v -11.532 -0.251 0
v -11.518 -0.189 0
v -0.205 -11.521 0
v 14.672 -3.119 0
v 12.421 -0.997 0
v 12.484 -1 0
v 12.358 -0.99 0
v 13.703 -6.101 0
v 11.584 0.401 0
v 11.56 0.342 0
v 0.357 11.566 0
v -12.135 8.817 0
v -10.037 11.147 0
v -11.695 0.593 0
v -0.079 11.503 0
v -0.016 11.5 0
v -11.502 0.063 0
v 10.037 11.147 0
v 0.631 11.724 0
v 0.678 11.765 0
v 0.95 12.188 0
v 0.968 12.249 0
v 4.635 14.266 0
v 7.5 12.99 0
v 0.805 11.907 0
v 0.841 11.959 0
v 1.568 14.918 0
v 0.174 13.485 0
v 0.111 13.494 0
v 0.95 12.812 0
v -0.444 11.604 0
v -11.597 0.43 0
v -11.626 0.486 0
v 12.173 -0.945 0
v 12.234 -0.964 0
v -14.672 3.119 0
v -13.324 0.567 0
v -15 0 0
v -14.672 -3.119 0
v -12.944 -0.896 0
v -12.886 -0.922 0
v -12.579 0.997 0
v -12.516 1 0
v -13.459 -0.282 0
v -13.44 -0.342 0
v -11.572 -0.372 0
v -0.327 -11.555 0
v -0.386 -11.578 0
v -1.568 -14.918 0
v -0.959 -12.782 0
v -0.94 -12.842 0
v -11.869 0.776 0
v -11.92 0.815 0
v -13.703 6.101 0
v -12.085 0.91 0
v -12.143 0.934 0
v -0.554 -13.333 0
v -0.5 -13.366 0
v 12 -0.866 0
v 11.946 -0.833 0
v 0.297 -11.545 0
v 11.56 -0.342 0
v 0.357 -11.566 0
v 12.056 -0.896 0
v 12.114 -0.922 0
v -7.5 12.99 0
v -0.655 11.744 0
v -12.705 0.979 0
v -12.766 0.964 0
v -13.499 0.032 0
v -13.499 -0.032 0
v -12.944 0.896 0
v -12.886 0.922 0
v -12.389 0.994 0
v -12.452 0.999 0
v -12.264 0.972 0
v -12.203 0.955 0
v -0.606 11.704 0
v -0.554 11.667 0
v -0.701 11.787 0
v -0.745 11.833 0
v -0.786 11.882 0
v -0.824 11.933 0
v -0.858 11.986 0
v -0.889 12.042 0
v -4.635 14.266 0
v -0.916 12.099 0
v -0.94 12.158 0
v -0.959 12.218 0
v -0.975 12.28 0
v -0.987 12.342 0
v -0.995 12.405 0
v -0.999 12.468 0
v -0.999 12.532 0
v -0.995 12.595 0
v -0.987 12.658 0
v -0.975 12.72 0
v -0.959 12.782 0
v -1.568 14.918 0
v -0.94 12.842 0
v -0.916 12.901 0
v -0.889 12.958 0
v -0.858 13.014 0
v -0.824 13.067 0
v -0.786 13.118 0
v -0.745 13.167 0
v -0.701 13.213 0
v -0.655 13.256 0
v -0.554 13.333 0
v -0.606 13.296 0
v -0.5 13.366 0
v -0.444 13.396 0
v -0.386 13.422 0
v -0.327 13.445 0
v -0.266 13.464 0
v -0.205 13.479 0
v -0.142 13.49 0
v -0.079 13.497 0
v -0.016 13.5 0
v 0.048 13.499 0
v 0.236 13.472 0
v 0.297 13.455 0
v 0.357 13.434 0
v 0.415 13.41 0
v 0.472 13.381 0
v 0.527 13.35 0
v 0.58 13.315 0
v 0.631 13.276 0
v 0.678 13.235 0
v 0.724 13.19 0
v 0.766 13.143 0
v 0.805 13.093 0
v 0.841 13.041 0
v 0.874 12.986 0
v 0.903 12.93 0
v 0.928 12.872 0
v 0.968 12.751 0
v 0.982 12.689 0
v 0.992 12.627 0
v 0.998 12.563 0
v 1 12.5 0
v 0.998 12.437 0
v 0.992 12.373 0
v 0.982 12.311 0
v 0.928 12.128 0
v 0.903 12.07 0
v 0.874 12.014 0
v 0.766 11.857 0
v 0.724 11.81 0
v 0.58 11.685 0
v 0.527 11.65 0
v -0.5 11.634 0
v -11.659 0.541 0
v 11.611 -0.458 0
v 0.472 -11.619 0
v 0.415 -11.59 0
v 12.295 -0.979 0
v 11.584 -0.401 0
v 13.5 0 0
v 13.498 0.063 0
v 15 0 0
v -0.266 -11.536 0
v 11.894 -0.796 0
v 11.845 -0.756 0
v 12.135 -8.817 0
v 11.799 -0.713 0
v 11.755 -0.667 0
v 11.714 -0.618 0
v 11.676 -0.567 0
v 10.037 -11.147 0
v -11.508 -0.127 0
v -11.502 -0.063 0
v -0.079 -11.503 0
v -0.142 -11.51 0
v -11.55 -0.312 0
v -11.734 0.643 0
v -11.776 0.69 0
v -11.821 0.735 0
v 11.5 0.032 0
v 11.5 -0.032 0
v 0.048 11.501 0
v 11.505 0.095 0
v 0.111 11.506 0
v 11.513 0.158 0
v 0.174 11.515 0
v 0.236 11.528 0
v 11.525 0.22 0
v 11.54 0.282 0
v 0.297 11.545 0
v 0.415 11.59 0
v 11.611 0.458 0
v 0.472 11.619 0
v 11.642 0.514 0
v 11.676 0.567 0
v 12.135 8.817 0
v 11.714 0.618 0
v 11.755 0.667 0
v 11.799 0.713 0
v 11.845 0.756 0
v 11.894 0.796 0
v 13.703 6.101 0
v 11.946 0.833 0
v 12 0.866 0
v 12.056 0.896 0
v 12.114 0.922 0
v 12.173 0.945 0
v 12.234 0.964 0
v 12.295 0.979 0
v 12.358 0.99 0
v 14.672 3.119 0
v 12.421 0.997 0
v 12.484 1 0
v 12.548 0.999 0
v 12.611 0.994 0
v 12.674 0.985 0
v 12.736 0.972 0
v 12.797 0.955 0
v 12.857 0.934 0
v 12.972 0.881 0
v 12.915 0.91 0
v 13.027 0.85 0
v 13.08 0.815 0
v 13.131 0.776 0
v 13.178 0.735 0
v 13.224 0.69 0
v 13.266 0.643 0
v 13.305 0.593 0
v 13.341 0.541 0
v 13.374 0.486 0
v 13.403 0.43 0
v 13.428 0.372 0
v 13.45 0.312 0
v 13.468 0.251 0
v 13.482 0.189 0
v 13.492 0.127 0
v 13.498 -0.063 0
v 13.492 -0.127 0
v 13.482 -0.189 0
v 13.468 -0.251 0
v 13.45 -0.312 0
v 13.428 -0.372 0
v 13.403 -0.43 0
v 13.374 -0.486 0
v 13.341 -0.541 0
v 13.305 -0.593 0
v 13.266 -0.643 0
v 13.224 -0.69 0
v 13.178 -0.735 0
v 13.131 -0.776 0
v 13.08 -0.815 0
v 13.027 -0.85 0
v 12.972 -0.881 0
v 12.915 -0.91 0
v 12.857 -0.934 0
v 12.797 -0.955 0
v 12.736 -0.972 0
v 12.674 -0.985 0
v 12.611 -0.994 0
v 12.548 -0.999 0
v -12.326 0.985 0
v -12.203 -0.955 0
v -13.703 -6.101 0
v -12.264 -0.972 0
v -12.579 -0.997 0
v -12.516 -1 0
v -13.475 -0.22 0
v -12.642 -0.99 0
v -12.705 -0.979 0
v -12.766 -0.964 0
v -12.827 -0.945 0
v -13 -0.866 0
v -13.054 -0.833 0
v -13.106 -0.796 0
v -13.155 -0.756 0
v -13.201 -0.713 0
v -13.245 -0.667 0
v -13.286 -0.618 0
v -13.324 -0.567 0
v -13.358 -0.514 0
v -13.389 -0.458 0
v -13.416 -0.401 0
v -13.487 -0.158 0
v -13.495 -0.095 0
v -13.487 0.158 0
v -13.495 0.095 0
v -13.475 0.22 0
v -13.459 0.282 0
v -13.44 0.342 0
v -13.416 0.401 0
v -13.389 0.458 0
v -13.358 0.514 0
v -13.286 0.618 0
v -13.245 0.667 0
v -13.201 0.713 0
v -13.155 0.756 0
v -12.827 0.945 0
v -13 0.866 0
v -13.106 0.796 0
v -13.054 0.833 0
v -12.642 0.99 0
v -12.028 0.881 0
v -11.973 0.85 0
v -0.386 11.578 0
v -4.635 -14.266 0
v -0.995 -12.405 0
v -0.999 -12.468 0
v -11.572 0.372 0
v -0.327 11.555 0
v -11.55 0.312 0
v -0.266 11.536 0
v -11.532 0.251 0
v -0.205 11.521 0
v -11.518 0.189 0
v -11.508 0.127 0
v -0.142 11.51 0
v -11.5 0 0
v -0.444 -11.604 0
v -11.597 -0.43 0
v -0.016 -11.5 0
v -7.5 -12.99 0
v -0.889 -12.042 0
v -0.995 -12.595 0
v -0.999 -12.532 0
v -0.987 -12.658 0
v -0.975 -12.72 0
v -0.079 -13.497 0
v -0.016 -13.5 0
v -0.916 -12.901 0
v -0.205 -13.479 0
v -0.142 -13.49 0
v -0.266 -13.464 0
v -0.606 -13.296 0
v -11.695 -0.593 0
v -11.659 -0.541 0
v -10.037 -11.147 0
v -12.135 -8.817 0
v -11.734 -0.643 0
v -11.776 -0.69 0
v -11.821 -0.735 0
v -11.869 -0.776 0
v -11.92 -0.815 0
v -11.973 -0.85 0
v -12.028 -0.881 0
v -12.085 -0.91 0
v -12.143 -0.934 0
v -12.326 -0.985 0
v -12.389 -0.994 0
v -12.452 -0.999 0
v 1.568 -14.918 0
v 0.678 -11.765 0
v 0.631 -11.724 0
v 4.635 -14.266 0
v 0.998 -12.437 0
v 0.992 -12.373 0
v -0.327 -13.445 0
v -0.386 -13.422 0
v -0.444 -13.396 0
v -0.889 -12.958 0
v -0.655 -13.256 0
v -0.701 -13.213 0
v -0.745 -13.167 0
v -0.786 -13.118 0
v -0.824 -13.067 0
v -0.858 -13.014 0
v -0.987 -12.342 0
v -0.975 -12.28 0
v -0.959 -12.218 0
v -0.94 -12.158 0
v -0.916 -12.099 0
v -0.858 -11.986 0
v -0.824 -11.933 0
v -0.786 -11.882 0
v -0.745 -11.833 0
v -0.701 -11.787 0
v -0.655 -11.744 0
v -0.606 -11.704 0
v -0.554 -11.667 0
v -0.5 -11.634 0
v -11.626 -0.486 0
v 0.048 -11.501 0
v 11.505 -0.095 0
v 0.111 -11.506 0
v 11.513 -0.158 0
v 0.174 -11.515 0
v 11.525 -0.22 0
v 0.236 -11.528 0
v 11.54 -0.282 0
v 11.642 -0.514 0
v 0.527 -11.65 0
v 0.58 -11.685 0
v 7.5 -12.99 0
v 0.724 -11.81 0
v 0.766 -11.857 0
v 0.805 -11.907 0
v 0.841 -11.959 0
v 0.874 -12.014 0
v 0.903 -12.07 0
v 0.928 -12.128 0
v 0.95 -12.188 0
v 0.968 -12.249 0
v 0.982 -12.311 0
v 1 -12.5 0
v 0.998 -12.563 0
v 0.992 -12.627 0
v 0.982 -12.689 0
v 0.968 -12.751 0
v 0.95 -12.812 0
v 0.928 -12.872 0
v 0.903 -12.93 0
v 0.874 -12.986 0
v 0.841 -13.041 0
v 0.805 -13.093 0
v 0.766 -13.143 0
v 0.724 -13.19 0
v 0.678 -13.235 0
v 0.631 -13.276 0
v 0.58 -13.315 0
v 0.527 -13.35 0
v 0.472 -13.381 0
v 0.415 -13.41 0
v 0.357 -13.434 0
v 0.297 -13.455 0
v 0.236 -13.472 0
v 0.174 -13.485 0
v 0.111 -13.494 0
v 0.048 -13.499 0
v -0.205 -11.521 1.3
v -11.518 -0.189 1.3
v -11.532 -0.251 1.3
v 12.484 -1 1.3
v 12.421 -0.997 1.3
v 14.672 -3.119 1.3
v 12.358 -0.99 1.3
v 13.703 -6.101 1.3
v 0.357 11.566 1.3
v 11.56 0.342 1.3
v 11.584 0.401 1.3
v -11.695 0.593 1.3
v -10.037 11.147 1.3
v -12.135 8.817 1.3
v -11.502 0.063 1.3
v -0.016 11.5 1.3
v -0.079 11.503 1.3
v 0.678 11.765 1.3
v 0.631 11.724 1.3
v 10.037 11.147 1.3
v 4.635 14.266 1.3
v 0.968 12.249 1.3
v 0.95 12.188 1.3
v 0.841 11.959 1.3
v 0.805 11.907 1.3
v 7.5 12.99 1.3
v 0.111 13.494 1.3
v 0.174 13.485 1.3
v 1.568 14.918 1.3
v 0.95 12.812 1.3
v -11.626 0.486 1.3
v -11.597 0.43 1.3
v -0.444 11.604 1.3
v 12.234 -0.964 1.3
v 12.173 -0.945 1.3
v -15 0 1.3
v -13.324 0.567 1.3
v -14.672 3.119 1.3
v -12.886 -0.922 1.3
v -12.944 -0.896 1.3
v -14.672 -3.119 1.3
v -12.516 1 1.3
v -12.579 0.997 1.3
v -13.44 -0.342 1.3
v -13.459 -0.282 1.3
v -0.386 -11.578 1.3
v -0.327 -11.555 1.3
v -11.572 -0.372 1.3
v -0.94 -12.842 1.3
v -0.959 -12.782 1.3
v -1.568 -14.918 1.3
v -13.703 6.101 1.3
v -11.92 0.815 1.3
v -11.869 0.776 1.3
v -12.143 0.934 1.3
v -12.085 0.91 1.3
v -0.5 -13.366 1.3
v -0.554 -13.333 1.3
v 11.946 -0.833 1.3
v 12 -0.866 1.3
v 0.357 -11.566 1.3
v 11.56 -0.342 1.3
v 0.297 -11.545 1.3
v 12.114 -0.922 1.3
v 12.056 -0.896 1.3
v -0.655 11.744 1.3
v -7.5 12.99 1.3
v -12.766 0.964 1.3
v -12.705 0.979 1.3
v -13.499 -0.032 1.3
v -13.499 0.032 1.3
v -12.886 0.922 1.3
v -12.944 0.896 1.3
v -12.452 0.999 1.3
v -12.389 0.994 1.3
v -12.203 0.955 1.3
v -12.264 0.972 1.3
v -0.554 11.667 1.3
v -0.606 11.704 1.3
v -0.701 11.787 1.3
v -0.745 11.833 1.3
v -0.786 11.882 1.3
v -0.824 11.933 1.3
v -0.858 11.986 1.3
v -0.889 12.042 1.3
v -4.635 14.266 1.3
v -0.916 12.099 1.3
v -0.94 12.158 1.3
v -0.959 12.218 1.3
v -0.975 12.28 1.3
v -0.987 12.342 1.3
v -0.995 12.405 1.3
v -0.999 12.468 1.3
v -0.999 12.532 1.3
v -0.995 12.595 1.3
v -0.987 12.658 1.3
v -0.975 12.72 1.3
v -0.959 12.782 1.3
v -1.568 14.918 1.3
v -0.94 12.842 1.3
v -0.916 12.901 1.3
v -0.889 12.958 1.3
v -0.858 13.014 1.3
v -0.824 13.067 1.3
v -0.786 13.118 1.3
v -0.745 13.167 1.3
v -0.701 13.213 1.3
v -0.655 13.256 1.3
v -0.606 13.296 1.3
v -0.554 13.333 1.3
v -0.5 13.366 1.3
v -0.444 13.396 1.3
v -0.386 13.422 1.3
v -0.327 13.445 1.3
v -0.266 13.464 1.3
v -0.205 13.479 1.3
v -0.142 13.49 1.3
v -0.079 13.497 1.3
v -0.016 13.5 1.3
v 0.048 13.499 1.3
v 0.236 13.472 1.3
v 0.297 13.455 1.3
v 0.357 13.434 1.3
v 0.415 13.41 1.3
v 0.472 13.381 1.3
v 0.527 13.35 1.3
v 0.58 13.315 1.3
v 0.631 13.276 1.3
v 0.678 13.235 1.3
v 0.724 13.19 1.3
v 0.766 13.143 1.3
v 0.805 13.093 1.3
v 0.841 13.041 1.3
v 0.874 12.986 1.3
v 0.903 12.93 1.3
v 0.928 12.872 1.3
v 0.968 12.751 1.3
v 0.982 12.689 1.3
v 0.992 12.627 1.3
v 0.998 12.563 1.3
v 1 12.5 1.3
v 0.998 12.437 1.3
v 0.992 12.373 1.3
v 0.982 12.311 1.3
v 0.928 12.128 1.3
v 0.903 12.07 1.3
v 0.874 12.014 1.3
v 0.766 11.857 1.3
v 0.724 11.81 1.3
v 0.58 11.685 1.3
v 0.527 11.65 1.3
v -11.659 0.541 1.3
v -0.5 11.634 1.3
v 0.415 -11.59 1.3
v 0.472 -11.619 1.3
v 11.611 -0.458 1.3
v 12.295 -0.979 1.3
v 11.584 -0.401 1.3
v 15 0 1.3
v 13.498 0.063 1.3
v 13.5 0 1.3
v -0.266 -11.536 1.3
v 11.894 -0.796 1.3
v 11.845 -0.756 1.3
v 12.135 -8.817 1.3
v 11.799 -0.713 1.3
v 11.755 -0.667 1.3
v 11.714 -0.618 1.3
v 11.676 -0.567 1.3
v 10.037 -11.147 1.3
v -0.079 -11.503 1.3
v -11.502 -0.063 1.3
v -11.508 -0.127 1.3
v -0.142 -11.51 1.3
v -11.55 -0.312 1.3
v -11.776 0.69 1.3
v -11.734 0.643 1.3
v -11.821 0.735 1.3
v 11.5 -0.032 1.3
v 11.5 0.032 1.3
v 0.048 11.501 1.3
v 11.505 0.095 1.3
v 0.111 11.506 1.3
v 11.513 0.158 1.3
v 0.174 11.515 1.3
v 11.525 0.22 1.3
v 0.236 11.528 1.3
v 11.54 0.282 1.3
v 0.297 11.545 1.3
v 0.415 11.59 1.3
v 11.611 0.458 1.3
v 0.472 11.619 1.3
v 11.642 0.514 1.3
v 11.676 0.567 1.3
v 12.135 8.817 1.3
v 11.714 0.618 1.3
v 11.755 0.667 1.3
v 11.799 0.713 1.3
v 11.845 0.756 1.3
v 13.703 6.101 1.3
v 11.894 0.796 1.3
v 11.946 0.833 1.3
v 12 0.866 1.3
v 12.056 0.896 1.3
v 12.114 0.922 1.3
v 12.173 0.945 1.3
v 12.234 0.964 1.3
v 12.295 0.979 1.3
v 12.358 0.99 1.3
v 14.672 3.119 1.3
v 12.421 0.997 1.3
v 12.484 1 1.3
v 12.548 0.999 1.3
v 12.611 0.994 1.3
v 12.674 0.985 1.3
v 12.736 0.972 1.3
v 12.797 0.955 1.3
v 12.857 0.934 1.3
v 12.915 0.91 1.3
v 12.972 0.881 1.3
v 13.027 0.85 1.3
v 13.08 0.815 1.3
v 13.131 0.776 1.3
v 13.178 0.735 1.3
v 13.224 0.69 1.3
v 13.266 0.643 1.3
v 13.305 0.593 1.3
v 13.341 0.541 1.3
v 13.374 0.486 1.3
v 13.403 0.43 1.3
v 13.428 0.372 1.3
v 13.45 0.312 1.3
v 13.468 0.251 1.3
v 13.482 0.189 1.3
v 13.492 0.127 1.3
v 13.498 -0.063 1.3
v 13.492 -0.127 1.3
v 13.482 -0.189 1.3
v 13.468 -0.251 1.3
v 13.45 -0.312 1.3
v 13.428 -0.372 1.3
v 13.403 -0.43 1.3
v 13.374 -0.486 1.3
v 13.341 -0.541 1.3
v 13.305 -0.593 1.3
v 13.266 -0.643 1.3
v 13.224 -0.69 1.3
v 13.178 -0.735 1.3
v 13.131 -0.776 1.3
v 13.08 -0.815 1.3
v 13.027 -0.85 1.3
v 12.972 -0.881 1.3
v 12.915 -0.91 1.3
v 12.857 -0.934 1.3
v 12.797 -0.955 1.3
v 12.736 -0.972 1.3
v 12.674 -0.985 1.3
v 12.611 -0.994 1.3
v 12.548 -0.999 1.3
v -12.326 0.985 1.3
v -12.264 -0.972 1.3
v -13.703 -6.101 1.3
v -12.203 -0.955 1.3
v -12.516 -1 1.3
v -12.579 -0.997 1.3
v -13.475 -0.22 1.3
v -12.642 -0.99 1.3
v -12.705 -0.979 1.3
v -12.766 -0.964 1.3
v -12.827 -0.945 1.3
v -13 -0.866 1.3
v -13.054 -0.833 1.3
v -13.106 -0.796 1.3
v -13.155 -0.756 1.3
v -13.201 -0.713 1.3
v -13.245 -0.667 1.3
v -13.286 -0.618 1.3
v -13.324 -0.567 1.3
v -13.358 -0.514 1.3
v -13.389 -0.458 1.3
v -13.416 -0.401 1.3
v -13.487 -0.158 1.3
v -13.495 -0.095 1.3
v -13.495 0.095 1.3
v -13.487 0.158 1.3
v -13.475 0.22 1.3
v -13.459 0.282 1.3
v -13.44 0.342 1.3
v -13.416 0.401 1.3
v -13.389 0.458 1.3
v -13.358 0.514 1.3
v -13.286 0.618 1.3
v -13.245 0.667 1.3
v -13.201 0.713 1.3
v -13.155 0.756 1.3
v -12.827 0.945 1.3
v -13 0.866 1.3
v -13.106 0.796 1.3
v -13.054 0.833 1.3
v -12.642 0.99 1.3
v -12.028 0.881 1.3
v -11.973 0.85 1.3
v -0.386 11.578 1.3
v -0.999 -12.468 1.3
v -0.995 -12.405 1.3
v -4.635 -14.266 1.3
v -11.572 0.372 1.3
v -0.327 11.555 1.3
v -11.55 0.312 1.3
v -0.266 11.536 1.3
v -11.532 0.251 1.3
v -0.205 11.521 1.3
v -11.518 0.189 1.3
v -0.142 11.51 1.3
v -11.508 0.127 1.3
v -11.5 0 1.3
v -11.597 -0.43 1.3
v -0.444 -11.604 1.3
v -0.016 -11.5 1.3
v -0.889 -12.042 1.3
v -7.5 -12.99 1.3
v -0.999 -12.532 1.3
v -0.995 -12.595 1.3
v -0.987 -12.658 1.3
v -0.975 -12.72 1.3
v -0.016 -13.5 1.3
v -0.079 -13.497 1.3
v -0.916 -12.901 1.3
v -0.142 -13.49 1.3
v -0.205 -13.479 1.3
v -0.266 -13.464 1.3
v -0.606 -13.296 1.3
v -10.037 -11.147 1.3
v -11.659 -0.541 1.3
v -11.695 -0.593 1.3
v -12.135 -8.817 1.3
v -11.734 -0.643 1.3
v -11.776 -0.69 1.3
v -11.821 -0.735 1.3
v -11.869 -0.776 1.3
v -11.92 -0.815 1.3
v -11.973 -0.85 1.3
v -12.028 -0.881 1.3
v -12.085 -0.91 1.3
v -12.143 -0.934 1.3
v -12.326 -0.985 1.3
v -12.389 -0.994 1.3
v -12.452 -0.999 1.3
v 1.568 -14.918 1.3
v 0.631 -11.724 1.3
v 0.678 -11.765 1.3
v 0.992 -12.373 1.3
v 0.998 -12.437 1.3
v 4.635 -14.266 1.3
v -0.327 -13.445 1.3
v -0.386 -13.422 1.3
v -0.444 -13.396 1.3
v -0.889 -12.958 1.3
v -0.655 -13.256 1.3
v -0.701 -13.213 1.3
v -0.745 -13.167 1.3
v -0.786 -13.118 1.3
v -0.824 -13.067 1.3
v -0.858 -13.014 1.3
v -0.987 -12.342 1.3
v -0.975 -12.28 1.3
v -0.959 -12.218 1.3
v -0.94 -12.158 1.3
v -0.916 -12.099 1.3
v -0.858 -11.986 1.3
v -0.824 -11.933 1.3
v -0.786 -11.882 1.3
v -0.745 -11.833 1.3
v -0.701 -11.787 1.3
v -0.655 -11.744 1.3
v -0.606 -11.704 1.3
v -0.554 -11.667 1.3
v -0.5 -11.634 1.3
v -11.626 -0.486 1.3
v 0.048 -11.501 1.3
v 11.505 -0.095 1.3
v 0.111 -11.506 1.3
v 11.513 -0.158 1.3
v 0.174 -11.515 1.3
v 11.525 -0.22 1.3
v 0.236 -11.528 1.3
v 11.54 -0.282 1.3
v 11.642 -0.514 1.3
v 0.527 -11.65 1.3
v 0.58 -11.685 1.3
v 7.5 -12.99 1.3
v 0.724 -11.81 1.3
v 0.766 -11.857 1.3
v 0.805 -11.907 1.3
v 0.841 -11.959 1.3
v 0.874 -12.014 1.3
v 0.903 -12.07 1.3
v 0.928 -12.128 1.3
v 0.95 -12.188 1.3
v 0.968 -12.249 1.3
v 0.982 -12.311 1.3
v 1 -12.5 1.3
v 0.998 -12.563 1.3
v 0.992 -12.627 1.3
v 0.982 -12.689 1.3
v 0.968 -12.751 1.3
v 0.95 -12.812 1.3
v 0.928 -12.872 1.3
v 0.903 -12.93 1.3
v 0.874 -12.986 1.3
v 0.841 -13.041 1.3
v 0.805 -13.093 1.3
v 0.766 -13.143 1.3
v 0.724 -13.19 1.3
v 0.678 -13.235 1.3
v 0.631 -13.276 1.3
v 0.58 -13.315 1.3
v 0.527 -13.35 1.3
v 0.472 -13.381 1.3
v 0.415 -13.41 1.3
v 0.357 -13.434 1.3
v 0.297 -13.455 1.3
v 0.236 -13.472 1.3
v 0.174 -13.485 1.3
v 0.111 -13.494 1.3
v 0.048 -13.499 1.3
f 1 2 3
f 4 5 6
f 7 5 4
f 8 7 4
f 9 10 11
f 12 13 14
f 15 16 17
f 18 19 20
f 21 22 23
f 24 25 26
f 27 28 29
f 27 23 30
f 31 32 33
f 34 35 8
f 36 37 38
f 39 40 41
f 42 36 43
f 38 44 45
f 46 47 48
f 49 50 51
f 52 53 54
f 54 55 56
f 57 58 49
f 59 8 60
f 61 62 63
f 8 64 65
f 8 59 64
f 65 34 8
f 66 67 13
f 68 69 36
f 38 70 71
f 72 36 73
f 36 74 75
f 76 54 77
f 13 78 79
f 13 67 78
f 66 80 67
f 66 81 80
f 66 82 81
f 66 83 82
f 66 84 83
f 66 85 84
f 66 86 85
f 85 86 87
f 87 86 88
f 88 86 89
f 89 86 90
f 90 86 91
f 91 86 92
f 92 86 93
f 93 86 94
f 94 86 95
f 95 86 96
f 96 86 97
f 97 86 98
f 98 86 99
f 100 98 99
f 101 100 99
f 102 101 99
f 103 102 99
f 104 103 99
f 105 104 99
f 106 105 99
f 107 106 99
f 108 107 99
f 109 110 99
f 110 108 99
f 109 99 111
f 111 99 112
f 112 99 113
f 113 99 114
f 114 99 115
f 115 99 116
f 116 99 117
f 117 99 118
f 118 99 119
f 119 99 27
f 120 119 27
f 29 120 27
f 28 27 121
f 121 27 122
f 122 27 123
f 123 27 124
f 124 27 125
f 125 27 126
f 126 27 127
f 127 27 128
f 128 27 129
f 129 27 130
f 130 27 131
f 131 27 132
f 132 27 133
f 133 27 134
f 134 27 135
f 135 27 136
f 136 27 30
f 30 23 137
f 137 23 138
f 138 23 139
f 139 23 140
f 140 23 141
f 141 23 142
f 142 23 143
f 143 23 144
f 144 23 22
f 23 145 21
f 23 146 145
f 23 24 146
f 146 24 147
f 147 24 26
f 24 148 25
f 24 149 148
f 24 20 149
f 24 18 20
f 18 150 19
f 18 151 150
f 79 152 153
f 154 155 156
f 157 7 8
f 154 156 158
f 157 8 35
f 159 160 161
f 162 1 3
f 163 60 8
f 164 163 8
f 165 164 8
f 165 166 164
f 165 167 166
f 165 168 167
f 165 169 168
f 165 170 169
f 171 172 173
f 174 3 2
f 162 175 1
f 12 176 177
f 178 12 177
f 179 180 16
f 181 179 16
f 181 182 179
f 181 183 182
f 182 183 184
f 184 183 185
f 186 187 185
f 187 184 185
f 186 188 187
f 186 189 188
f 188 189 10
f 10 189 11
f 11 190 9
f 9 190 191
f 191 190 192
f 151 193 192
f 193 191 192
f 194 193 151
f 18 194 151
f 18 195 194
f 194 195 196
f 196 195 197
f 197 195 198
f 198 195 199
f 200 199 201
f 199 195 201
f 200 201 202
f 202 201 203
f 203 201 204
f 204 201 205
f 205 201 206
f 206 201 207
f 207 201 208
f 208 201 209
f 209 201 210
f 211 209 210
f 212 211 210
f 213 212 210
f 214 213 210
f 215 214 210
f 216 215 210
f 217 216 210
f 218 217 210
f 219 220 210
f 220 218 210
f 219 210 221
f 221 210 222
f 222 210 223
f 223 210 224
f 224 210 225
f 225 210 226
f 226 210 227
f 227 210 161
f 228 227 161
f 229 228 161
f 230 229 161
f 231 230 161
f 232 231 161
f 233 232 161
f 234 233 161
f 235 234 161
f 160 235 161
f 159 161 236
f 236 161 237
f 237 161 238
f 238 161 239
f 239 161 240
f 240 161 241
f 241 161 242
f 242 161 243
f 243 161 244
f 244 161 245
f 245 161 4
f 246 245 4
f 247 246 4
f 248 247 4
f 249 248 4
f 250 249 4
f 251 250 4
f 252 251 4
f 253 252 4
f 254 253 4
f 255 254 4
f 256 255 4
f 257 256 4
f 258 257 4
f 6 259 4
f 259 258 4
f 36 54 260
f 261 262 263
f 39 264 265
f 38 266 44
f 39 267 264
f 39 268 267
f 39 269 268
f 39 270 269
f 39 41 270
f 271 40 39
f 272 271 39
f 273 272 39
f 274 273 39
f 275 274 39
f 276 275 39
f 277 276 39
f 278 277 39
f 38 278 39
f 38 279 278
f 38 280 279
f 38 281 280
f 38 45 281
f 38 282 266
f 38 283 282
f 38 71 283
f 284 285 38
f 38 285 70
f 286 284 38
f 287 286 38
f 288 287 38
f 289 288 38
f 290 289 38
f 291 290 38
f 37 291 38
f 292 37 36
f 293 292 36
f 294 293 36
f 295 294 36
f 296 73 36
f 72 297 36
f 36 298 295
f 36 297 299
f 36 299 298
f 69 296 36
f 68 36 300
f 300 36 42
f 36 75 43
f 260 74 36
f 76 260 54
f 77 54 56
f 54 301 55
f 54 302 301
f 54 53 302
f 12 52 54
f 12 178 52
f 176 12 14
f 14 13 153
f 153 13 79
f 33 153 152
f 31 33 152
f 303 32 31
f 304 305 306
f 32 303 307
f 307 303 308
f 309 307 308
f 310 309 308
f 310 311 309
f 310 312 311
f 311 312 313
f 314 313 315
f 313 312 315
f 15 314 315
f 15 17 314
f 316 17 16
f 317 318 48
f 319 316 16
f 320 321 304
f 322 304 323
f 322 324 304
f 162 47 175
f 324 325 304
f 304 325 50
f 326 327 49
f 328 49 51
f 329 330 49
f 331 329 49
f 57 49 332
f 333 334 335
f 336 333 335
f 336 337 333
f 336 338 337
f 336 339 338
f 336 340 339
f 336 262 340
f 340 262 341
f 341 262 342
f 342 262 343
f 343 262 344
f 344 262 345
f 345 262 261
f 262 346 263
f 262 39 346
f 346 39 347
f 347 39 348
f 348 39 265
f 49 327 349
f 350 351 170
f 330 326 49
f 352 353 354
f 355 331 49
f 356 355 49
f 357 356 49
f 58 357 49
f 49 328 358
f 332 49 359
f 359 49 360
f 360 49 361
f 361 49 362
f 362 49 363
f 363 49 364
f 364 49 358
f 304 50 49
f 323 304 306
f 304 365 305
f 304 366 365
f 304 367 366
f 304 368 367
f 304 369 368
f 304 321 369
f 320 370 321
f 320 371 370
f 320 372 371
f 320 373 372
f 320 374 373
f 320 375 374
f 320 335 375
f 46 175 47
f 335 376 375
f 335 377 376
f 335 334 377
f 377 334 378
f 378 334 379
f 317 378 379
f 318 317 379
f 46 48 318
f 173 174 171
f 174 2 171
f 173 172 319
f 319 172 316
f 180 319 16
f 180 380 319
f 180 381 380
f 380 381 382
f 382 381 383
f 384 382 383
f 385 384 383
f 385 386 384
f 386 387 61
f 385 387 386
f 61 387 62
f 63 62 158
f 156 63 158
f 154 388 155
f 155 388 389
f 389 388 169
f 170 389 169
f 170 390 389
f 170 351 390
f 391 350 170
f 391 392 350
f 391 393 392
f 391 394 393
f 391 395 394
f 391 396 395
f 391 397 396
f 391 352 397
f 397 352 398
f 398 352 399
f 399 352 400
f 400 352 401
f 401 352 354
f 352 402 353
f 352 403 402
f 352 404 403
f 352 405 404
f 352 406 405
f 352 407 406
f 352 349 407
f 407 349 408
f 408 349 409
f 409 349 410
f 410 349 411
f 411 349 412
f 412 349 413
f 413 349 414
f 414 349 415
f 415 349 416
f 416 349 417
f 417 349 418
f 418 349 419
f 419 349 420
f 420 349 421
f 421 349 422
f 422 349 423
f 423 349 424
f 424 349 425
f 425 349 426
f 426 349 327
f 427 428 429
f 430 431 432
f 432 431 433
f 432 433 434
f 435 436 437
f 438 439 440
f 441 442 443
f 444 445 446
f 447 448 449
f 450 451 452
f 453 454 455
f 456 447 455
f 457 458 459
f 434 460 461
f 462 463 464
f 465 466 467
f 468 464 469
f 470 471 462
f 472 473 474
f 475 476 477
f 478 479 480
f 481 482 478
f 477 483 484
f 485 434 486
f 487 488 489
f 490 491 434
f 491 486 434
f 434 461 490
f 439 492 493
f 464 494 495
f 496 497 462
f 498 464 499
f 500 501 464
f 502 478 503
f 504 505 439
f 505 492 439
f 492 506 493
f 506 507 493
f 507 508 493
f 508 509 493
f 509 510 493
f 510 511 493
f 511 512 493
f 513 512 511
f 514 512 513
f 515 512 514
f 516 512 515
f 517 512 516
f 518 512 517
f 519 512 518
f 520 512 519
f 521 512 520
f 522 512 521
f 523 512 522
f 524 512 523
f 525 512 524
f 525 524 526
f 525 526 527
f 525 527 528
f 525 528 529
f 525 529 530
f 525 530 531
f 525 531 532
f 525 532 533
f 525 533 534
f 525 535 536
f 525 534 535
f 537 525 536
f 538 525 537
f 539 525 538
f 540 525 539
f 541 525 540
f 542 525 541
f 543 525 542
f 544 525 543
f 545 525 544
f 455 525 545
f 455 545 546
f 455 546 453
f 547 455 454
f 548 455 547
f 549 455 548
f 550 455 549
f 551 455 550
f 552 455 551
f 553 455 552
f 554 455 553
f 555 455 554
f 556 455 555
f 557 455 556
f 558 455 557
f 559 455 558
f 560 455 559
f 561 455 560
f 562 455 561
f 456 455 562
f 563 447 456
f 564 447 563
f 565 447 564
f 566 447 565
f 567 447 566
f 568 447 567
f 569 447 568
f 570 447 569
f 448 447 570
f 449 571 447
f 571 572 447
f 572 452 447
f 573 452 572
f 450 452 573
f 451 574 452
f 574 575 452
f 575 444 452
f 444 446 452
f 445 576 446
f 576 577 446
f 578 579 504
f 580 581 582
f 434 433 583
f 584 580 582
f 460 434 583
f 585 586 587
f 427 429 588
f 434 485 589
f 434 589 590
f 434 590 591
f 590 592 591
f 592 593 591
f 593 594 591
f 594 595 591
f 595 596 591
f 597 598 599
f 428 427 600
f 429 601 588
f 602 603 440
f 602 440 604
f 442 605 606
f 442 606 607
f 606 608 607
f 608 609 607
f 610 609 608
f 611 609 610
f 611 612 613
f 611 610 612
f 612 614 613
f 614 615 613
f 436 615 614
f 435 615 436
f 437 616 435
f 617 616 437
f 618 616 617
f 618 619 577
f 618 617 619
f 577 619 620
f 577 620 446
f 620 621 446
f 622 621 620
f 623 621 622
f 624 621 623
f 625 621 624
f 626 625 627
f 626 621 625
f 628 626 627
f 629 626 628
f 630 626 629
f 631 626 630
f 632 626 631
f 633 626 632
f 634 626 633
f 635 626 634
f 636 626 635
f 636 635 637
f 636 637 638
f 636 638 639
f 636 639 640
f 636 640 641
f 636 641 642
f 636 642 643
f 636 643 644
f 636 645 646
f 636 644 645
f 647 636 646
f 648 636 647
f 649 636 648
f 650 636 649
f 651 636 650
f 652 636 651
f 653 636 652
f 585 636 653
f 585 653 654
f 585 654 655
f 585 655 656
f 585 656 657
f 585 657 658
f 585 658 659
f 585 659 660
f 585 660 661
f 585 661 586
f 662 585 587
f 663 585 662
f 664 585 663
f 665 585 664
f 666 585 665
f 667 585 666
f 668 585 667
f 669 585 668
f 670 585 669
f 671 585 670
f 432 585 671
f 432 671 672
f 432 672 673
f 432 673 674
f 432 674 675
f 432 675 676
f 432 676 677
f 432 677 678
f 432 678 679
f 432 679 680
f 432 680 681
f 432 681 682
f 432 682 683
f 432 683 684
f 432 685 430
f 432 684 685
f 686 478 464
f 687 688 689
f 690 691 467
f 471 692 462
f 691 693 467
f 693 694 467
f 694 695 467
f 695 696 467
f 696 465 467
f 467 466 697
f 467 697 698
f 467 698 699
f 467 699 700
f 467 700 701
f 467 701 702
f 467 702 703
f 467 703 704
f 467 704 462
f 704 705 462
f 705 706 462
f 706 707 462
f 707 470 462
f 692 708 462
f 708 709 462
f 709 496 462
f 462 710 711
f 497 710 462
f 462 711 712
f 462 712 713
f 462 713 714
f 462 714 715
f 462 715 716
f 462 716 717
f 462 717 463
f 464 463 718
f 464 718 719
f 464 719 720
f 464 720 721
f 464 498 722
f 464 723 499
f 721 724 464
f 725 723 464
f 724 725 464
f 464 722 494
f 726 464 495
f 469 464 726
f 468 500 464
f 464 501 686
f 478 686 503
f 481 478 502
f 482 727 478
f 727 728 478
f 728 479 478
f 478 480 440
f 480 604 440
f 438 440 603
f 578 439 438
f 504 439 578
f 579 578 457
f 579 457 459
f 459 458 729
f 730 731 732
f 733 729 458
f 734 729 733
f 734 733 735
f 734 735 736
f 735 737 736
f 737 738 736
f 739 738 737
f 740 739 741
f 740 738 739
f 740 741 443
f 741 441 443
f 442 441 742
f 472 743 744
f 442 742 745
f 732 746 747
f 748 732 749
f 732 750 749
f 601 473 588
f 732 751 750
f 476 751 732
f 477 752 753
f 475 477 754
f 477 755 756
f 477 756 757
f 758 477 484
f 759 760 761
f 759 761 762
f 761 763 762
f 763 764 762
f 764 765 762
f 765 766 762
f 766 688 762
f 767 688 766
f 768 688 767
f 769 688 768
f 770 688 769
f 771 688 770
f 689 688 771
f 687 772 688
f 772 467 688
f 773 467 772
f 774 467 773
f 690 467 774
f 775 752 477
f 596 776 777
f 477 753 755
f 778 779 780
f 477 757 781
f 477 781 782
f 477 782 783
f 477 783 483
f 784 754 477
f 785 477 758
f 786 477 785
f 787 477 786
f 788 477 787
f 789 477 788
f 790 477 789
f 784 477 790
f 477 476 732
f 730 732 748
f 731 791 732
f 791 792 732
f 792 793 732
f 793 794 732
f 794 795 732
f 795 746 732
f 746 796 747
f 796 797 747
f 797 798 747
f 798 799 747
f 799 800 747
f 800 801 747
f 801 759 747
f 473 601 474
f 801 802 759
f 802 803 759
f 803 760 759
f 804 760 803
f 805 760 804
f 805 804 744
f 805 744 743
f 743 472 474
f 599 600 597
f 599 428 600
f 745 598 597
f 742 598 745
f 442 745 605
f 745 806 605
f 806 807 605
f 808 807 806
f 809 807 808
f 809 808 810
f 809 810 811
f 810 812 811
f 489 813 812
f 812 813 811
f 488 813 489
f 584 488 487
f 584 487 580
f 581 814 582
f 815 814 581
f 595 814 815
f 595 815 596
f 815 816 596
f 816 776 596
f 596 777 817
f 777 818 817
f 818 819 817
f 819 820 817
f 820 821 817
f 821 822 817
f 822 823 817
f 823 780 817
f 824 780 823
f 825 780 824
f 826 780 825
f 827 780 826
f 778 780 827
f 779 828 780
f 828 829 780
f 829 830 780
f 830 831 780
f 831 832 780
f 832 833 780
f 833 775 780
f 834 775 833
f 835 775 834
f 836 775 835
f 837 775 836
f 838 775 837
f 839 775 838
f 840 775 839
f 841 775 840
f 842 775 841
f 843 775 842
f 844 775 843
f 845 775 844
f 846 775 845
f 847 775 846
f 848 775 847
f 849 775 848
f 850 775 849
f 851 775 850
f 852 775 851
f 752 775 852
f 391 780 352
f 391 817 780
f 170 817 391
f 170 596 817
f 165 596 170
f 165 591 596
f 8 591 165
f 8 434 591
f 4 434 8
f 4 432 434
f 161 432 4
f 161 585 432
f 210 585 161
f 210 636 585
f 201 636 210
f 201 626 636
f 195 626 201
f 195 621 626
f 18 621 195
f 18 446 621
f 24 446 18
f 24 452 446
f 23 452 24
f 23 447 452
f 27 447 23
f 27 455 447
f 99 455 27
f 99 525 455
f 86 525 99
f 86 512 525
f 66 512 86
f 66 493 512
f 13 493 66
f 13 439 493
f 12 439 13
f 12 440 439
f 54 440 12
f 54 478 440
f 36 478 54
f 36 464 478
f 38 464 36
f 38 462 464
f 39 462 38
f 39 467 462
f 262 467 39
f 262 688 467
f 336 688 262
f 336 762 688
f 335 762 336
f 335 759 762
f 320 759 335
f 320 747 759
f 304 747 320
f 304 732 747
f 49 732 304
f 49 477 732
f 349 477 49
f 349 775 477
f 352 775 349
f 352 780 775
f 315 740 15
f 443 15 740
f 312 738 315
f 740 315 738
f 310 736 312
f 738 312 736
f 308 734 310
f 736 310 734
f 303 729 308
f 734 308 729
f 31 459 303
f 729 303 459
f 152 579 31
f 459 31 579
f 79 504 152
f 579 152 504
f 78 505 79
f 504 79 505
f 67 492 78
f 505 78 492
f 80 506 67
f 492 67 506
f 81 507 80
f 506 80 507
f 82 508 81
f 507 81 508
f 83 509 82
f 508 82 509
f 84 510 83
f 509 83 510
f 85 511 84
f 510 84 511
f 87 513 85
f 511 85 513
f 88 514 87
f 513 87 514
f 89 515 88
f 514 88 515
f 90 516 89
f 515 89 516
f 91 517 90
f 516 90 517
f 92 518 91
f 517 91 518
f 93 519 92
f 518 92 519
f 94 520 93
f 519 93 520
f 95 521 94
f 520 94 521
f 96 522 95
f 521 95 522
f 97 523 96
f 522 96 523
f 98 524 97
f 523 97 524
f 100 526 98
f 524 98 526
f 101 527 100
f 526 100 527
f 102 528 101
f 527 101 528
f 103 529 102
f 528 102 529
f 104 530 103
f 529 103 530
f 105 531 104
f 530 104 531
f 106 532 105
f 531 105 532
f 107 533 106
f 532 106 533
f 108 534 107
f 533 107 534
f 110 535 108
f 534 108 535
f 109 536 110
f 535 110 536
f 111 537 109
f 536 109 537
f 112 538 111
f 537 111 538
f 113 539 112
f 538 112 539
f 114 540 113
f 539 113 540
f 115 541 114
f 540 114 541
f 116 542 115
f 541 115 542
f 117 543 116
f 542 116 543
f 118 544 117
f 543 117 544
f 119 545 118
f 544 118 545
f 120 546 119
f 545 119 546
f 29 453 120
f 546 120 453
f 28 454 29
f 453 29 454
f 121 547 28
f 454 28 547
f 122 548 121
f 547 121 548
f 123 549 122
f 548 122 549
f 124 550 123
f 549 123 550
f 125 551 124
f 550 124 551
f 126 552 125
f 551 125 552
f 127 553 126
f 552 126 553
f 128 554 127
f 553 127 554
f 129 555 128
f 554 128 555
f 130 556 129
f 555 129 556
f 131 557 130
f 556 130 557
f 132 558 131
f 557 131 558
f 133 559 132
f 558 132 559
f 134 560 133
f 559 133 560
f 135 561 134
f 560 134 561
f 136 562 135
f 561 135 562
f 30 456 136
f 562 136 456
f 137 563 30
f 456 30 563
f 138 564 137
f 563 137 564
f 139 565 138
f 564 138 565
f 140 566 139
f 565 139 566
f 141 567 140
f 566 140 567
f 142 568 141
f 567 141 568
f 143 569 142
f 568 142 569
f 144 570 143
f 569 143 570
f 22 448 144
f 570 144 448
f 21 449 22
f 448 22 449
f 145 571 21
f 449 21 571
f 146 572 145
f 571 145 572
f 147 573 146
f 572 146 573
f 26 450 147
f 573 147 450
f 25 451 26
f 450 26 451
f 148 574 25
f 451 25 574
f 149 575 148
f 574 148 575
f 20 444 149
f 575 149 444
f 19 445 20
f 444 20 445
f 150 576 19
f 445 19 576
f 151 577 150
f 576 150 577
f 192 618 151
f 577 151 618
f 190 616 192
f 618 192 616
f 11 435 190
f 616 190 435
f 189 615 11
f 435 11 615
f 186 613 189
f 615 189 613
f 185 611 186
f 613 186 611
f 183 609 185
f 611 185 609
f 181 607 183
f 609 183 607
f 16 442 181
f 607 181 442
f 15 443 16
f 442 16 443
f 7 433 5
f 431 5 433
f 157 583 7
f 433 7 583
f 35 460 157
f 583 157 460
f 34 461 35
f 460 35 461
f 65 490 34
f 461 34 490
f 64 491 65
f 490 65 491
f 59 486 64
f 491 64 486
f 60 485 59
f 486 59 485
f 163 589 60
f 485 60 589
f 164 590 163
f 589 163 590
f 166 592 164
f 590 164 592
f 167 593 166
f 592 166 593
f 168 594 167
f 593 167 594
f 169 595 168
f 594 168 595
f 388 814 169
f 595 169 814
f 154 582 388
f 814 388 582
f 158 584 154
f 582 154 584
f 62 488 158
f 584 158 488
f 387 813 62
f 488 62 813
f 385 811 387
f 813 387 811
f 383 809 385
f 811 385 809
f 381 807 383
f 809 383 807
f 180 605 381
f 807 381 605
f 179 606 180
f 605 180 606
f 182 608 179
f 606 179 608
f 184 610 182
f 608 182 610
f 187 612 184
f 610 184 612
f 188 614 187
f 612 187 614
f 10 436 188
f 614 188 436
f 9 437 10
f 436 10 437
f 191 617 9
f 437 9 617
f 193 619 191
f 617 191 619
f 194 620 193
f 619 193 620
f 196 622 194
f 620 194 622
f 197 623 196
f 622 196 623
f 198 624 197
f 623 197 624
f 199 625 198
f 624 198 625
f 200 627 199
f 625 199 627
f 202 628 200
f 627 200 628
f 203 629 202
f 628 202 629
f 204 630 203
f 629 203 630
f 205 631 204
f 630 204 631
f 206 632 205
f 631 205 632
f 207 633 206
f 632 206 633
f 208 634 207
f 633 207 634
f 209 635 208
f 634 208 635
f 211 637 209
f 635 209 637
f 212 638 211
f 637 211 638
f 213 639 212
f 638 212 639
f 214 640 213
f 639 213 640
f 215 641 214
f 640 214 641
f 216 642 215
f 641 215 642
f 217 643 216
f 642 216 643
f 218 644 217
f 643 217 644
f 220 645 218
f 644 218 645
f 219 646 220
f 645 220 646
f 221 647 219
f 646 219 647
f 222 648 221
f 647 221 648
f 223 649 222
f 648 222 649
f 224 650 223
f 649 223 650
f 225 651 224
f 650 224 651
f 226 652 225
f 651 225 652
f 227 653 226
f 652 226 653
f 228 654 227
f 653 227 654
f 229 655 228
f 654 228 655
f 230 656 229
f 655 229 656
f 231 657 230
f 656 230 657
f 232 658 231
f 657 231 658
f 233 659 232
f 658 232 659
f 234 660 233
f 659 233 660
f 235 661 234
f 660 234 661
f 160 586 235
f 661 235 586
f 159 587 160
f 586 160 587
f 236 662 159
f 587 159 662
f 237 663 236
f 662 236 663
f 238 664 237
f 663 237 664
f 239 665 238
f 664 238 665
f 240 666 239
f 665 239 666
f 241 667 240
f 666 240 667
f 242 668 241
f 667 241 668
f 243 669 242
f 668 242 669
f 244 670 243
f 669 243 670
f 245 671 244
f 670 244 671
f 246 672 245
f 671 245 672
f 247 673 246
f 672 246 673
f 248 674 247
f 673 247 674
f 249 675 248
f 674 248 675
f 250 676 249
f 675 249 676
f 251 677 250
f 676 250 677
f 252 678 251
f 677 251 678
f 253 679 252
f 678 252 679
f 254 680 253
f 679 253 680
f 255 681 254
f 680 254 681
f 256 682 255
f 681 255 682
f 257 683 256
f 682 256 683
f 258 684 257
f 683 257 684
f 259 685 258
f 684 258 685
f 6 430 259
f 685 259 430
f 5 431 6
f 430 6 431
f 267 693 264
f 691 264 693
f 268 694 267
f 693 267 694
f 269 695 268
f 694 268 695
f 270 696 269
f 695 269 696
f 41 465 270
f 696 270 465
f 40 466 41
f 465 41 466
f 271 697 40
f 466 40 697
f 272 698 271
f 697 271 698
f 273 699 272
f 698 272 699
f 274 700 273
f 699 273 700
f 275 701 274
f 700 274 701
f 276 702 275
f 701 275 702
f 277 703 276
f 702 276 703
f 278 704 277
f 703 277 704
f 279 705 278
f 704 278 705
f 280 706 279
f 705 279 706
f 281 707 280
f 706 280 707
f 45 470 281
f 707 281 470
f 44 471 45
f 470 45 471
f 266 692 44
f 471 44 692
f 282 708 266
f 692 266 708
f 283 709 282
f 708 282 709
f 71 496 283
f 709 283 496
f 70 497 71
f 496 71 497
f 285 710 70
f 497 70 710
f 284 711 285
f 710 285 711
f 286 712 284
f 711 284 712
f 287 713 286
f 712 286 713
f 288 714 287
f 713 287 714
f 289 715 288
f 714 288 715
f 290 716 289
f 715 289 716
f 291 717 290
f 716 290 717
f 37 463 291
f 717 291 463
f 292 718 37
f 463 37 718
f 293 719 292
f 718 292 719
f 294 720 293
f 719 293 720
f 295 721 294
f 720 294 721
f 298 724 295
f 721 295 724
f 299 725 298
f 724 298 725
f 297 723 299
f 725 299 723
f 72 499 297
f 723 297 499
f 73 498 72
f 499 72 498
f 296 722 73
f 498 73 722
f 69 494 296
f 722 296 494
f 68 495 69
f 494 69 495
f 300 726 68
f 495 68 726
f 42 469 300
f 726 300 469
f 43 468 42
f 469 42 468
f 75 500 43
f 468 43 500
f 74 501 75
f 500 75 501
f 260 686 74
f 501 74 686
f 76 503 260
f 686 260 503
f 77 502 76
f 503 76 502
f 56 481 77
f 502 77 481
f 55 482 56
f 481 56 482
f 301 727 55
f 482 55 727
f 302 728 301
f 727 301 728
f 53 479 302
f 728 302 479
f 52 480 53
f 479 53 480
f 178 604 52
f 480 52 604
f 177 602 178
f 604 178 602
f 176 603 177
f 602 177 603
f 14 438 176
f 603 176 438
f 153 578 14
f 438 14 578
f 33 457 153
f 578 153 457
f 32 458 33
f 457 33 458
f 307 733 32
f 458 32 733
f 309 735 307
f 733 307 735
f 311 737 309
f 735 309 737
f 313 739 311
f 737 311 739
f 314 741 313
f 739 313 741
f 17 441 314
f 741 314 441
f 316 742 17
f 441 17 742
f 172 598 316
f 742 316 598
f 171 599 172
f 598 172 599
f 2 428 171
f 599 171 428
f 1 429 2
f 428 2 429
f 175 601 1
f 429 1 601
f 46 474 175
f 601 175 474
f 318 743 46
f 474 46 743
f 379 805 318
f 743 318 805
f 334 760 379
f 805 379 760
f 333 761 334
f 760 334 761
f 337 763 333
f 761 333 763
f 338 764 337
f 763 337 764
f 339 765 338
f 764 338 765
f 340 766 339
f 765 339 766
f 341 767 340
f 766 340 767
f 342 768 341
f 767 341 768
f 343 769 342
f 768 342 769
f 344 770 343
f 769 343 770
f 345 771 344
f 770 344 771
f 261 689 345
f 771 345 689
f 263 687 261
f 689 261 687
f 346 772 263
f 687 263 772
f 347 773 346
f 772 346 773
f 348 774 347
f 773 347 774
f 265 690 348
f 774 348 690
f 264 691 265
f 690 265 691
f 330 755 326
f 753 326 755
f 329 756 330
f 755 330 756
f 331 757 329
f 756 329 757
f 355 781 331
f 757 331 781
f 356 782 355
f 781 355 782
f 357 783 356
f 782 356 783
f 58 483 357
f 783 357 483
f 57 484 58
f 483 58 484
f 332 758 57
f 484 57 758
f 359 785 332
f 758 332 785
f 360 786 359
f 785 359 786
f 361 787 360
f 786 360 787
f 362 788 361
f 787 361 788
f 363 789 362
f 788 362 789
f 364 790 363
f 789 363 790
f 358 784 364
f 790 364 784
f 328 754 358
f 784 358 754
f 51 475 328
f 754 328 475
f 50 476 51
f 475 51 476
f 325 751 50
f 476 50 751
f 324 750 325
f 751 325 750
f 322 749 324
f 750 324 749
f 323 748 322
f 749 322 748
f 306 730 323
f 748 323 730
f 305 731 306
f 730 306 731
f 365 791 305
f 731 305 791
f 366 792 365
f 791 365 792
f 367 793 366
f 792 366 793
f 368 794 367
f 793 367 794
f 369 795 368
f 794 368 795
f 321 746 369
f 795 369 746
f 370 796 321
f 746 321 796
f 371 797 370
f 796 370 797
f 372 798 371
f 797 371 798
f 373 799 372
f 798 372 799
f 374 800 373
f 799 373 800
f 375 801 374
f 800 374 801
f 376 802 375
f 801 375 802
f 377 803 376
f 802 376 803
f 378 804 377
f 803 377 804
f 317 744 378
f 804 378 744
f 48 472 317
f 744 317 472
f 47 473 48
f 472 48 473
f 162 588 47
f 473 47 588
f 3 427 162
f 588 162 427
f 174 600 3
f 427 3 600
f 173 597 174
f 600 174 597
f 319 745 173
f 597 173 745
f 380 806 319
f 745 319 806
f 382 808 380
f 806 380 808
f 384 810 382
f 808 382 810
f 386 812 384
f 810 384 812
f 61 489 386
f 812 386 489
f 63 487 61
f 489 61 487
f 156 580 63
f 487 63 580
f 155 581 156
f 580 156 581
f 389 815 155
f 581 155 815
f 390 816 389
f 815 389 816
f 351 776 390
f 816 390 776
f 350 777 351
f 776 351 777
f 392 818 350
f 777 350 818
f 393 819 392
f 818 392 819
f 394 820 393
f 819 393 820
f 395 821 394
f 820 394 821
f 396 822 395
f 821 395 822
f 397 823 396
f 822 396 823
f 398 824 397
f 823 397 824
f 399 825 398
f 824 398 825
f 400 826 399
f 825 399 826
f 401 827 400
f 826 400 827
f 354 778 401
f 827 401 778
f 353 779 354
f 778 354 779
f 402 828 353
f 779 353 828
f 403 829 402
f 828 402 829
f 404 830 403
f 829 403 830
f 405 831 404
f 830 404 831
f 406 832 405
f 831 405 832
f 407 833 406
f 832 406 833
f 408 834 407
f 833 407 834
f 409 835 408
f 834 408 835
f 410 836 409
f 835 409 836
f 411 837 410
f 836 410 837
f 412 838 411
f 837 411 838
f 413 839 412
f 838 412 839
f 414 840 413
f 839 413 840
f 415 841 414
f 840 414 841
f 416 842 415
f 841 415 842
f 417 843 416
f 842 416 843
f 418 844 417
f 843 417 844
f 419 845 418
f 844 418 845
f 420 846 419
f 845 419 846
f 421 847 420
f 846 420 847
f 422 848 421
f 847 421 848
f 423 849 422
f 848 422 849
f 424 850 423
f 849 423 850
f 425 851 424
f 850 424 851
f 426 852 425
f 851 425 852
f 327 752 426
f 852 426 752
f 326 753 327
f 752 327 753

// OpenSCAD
// Circles or hearts with holes for rings
//
// TODO:
//	- Fine-tune hole position on straight sides of hearts

// Count of items in X direction
_CountX = 1;

// Count of items in Y direction
_CountY = 1;

// X spacing
_SpaceX = 50;

// Y spacing
_SpaceY = 50;

// Item thickness
_Thickness = 1.3;

// Item type
_ItemType = "Circle"; // [Circle, Heart]

/* [Circles] */

// Circle diameter
_Diameter = 30;

/* [Hearts] */

/* [Holes] */

// Hole diameter
_HoleDiameter = 1;

// Hole inset from perimeter
_HoleInset = 2.5;

// Render one circle with four holes
module RenderCircle(Diameter, Thickness, HoleDiameter, HoleInset)
{
	linear_extrude(Thickness)
	{
		difference()
		{
			// Matter
			{
				circle(d=Diameter);
			}
			
			// Antimatter
			{
				Radius = Diameter / 2 - HoleInset;
				for (Theta = [0 : 90 : 360])
				{
					PointX = Radius * cos(Theta);
					PointY = Radius * sin(Theta);
					
					translate([PointX, PointY, 0])
					{
						circle(HoleDiameter, $fn=99);
					}
				}
			}
		}
		
	}
}

// Render one heart with four holes
module RenderHeart(Diameter, Thickness, HoleDiameter, HoleInset)
{
	Radius = Diameter / 2;
	
	linear_extrude(Thickness)
	{
		difference()
		{
			// Matter
			{
				union()
				{
					square(Diameter, center=false);
					translate([Diameter, Radius, 0]) circle(d=Diameter);
					translate([Radius, Diameter, 0]) circle(d=Diameter);
				}
			}
			
			// Antimatter
			{
				union()
				{
					// Holes on straight sides
					translate([Radius, HoleInset, 0]) circle(HoleDiameter, $fn=99);
					translate([HoleInset, Radius, 0]) circle(HoleDiameter, $fn=99);
					
					// Holes on curved sides
					translate([Diameter + Radius - HoleInset, Radius, 0]) circle(HoleDiameter, $fn=99);
					translate([Radius, Diameter + Radius - HoleInset, 0]) circle(HoleDiameter, $fn=99);		
				}
			}
		}
	}
}

// Render a grid of circles or hearts
module RenderGrid(ItemType, CountX, CountY, SpaceX, SpaceY, Diameter, Thickness, HoleDiameter, HoleInset)
{
	for (x = [0 : CountX - 1])
	{
		for (y = [0 : CountY - 1])
		{
			PointX = x * SpaceX;
			PointY = y * SpaceY;
			
			translate([PointX, PointY, 0])
			{
				if (ItemType == "Circle") RenderCircle(Diameter, Thickness, HoleDiameter, HoleInset);
				if (ItemType == "Heart")  RenderHeart(Diameter, Thickness, HoleDiameter, HoleInset);
			}
		}
		
	}
}

module main()
{
	RenderGrid(_ItemType, _CountX, _CountY, _SpaceX, _SpaceY, _Diameter, _Thickness, _HoleDiameter, _HoleInset);
}

main();
